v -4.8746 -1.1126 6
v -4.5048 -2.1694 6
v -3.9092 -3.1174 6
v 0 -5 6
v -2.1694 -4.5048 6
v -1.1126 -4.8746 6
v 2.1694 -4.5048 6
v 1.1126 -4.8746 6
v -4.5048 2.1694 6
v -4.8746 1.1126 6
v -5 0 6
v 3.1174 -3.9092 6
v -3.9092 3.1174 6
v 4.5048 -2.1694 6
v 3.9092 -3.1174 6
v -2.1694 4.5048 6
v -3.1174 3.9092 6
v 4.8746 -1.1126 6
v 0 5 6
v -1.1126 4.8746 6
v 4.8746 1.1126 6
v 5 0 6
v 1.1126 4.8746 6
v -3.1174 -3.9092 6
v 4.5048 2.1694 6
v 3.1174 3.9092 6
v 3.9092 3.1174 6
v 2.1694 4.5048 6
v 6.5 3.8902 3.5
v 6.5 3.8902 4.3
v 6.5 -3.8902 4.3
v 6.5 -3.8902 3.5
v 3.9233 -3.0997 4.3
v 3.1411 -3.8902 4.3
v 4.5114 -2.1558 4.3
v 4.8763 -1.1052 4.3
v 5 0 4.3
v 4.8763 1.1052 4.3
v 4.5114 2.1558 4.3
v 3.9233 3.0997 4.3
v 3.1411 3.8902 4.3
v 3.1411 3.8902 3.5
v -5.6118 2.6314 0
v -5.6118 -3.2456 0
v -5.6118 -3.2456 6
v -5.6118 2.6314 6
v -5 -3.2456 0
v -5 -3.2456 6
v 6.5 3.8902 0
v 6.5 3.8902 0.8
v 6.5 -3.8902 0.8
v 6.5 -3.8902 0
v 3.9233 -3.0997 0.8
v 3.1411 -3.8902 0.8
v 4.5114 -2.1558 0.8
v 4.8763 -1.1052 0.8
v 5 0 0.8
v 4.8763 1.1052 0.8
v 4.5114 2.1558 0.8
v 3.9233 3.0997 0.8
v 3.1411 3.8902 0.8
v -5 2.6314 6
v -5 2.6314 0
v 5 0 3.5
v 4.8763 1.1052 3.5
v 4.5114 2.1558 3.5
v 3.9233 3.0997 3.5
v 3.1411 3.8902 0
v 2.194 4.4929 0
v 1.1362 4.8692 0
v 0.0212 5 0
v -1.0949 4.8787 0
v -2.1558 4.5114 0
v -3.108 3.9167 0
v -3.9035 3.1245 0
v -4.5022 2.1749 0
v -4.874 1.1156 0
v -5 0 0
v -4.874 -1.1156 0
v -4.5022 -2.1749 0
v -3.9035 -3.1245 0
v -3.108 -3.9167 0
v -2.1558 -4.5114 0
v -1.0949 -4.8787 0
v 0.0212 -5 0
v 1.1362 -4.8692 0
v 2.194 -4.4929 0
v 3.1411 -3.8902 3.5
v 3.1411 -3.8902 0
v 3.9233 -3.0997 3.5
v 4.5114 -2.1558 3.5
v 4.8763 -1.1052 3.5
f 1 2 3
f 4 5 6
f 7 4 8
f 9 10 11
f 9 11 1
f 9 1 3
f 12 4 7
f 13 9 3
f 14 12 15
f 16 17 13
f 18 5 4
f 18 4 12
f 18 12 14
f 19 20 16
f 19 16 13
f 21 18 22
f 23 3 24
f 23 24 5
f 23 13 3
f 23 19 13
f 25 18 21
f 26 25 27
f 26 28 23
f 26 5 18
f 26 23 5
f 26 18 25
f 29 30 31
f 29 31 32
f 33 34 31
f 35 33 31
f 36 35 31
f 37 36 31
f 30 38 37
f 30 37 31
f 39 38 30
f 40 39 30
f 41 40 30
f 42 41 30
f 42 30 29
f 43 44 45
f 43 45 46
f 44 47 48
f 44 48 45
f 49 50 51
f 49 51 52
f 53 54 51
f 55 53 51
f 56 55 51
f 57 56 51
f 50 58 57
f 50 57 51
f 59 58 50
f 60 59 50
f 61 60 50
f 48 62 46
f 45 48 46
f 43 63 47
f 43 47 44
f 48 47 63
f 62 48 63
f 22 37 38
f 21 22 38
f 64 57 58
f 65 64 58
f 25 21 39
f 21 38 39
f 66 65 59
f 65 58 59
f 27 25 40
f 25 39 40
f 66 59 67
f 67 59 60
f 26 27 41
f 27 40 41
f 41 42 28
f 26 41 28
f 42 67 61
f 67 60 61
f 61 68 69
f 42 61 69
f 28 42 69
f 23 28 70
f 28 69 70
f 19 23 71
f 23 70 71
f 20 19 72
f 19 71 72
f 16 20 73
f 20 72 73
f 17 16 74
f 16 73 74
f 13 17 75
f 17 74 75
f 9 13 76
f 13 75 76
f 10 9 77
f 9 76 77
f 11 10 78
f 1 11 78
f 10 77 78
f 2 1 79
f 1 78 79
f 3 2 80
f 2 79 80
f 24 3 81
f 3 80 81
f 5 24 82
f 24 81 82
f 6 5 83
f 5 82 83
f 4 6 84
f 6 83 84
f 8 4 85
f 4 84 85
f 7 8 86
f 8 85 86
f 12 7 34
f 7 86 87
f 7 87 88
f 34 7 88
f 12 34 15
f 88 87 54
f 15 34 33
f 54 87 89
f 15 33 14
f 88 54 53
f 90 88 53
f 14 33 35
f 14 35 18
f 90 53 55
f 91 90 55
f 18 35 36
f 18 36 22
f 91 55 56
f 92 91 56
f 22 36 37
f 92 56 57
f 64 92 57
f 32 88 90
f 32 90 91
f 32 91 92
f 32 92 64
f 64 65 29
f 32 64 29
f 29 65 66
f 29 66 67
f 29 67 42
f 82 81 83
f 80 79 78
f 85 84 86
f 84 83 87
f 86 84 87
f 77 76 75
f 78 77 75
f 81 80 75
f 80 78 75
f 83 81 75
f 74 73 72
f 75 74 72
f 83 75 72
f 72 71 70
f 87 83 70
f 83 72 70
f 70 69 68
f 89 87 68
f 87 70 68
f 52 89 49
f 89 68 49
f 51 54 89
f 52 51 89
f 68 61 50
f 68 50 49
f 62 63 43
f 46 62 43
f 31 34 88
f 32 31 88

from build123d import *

# Parameters (mm, degrees)
SKETCH_1_R             = 5
EXTRUDE_1_DEPTH        = 6
SKETCH_2_W             = 0.611830912
SKETCH_2_H             = 5.877066701
EXTRUDE_2_DEPTH        = 6
SKETCH_3_W             = 0.8
SKETCH_3_H             = 7.780395236
EXTRUDE_3_DEPTH        = 6.5
PATTERN_LINEAR_1_COUNT = 2
PATTERN_LINEAR_1_PITCH = 3.5


with BuildPart() as part:
    # 草图1 → 凸台-拉伸1 (new body)
    with BuildSketch(Plane.XY):
        Circle(SKETCH_1_R)
    extrude(amount=EXTRUDE_1_DEPTH)

    # 草图3 → 凸台-拉伸3 (add)
    with BuildSketch(Plane(origin=(0, 0, 0), x_dir=(0, 0, -1), z_dir=(1, 0, 0))):
        with Locations((-0.4, 0)):
            Rectangle(SKETCH_3_W, SKETCH_3_H)
    extrude_3 = extrude(amount=EXTRUDE_3_DEPTH)

    # 阵列(线性)1: 凸台-拉伸3 ×2
    with Locations(*[(0, 0, i * PATTERN_LINEAR_1_PITCH) for i in range(1, PATTERN_LINEAR_1_COUNT)]):
        add(extrude_3)


with BuildPart() as body_2:
    # 草图2 → 凸台-拉伸2 (new body)
    with BuildSketch(Plane(origin=(0, 0, 0), x_dir=(-1, 0, 0), z_dir=(0, 0, -1))):
        with Locations((5.305915456, -0.307115125)):
            Rectangle(SKETCH_2_W, SKETCH_2_H)
    extrude(amount=-EXTRUDE_2_DEPTH)


solid = Compound([part.part, body_2.part])
